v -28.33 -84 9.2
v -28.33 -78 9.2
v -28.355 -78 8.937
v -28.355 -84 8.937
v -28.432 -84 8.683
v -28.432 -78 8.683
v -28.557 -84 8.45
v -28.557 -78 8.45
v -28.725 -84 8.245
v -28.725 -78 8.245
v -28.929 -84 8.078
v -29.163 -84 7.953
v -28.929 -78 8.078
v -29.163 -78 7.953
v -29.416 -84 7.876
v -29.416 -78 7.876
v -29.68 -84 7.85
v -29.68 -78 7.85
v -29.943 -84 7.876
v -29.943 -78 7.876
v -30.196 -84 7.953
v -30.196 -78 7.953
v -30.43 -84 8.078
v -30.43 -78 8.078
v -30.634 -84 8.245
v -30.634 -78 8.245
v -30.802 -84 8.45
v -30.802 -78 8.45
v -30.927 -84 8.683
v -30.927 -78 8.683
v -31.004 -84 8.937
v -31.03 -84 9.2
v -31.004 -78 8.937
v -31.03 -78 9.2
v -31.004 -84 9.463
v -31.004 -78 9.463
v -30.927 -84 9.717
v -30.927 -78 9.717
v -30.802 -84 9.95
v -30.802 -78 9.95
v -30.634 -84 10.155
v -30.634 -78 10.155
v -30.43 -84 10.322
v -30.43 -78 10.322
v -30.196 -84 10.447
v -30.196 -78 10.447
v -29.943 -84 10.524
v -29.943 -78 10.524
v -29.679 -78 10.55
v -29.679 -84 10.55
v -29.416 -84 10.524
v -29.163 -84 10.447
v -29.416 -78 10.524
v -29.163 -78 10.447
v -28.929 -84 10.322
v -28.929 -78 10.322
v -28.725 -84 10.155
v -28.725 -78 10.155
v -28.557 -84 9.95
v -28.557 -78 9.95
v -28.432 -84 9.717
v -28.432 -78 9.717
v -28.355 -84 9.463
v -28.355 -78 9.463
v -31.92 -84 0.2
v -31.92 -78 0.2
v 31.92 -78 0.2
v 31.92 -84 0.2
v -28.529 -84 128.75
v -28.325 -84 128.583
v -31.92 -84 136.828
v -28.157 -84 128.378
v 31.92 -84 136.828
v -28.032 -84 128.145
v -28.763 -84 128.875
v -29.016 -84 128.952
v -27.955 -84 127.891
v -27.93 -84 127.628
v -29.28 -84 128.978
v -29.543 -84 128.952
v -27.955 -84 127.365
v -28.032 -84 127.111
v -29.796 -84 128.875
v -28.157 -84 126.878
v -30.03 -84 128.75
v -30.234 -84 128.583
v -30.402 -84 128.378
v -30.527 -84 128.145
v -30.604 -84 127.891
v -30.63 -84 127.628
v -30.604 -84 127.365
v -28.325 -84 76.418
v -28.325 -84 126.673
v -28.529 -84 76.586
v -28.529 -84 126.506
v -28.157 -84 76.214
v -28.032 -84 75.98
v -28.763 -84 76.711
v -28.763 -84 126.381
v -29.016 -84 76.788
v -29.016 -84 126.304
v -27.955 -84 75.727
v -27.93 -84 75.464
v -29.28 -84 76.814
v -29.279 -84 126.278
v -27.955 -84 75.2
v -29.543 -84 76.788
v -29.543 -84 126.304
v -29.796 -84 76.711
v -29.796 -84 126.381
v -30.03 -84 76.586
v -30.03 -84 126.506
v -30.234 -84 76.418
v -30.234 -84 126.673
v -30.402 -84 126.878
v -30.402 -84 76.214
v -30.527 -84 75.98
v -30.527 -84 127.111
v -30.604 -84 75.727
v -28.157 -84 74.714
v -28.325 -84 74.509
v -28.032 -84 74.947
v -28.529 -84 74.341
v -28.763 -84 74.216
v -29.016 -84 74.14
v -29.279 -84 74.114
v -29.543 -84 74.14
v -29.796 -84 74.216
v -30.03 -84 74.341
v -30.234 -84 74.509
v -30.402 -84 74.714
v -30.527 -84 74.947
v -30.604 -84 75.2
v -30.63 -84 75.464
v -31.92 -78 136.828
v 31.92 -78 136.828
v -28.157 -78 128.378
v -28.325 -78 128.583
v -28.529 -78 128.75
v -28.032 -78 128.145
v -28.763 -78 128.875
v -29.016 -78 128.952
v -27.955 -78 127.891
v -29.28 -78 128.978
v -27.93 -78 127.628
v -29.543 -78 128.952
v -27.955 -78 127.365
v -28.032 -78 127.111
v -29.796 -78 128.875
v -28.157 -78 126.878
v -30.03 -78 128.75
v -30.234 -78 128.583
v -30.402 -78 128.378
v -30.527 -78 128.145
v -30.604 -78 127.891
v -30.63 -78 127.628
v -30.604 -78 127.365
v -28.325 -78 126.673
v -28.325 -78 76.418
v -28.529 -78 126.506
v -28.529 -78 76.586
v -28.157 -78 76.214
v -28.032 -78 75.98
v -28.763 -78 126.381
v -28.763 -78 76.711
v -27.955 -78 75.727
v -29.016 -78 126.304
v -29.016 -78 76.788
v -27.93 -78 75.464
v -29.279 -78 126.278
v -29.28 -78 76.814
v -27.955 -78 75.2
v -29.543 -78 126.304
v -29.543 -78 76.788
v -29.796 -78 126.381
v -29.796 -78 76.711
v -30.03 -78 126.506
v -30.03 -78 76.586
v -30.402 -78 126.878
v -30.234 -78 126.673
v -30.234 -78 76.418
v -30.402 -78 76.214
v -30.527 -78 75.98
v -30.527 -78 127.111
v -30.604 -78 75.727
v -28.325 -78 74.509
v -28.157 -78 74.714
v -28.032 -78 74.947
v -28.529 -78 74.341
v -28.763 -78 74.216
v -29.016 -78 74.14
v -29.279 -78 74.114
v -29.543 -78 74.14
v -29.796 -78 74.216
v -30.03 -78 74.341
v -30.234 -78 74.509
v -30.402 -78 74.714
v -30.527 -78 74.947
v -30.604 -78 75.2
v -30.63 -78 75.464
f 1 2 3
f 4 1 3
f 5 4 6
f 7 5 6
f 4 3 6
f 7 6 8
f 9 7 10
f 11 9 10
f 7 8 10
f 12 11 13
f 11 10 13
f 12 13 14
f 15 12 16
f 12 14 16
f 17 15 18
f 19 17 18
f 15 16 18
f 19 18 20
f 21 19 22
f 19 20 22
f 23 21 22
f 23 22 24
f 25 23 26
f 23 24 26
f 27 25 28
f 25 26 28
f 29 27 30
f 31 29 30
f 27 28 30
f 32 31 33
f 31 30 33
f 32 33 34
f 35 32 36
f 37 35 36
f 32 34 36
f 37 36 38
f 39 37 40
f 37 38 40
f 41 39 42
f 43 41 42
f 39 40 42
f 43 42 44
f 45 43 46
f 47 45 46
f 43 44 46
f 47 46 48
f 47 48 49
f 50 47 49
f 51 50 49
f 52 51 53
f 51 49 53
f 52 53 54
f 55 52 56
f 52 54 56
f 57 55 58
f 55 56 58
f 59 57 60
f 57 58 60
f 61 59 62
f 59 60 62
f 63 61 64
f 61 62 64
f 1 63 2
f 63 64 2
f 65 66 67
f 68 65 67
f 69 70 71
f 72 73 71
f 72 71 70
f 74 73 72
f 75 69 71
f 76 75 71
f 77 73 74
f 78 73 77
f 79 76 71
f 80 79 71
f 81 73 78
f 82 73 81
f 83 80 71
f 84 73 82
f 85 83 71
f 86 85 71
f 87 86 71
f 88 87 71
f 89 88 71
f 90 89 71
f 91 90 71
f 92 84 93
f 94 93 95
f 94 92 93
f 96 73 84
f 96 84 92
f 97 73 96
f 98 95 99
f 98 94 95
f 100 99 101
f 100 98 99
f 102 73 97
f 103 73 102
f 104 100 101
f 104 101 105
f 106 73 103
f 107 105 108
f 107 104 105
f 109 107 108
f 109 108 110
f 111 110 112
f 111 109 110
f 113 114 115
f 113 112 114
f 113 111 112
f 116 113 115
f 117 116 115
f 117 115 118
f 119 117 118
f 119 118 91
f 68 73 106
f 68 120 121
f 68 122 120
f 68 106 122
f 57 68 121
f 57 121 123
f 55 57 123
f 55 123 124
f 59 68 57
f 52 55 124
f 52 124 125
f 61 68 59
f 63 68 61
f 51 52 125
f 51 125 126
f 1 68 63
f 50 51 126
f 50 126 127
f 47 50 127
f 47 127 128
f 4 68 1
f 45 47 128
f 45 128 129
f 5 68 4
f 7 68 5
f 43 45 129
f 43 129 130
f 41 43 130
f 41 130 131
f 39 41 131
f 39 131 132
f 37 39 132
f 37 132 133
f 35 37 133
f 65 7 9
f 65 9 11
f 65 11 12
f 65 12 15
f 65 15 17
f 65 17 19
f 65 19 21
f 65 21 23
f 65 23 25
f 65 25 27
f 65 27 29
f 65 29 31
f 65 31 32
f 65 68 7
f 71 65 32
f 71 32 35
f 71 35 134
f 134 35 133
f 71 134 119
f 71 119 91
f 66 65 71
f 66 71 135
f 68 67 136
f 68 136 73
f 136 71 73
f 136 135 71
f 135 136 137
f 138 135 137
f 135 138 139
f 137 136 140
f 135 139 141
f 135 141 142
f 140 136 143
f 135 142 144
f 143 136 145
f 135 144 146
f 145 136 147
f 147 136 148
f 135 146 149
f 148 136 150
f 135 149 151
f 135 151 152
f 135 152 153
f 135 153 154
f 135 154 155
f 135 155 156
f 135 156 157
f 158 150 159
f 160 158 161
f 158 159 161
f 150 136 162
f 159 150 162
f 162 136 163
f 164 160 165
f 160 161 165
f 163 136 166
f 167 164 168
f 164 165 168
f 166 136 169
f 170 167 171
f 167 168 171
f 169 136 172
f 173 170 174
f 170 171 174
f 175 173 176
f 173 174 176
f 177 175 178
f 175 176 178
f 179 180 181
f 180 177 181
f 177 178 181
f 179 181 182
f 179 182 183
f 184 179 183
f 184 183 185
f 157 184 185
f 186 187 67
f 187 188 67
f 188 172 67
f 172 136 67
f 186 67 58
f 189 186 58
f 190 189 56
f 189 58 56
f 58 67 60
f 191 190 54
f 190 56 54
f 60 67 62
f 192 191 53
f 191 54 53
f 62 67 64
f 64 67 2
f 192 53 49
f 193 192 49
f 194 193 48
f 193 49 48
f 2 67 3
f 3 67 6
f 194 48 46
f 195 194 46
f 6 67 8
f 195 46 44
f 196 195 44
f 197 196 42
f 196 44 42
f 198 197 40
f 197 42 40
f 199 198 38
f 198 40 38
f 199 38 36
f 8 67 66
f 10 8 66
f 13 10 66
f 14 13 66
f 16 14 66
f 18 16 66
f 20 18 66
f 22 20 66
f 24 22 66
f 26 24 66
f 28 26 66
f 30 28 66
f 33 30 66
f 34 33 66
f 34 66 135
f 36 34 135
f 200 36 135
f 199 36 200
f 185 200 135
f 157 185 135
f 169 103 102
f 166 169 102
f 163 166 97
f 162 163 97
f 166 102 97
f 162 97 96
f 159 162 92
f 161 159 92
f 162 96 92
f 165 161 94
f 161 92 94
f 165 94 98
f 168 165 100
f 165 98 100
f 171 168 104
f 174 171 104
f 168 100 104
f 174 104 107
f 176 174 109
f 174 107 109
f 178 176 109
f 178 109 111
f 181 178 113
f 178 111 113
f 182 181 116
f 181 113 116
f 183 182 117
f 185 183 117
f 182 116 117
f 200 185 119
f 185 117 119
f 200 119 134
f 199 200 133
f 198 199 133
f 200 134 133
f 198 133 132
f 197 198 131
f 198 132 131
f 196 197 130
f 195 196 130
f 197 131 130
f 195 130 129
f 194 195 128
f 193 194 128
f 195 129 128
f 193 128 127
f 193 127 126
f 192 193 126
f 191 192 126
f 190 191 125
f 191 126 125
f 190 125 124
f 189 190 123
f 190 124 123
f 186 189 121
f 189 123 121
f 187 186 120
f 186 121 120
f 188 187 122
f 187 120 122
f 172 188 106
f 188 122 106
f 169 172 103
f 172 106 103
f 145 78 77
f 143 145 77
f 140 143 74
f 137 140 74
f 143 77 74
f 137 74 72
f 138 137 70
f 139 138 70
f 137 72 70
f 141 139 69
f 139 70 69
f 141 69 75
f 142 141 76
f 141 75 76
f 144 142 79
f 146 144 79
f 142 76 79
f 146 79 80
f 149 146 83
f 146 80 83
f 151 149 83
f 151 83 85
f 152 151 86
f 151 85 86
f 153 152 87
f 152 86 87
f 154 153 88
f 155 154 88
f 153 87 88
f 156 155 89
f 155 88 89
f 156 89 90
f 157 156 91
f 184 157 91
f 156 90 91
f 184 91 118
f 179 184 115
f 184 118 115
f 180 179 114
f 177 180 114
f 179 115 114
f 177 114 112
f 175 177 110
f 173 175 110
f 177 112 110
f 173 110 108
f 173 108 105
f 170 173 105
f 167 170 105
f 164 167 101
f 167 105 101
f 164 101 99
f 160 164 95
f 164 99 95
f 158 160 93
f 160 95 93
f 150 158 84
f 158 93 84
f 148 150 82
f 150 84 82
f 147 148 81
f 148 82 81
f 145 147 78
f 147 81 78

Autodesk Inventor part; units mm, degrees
ref_plane "YZ Plane" through (0, 0, 0) normal (1, 0, 0) x (0, 1, 0)
ref_plane "XZ Plane" through (0, 0, 0) normal (0, 1, 0) x (-1, 0, 0)
ref_plane "XY Plane" through (0, 0, 0) normal (0, 0, 1) x (1, 0, 0)
sketch "스케치1" plane through (0, 0, 0.2) normal (0, 0, 1) x (1, 0, 0)
  circle A0 centre (-22.9203, -41.3997) radius 1.35 projected
  circle A1 centre (-22.9203, 35.0003) radius 1.35 projected
  line L0 (-31.9205, -84) -> (-31.9205, 78) projected
  line L1 (31.9205, -84) -> (-31.9205, -84) projected
  line L2 (31.9205, 78) -> (31.9205, -84) projected
  line L3 (-31.9205, 78) -> (31.9205, 78) projected
  circle A2 centre (-22.9203, -75) radius 1.45 projected
  circle A3 centre (-22.9203, 69) radius 1.45 projected
  line L4 (-31.9205, -84) -> (31.9205, -84)
  line L5 (31.9205, -84) -> (31.9205, -78)
  line L6 (31.9205, -78) -> (-31.9205, -78)
  line L7 (-31.9205, -78) -> (-31.9205, -84)
  point P0 (0, 0)
  point P1 (-31.9205, -78)
extrude "돌출1" add sketch "스케치1" along normal blind 136.628 contours L0 L6 L2 L1
sketch "스케치4" plane through (-31.9205, -84, 0.2) normal (0, -1, 0) x (1, 0, 0)
  circle A0 centre (2.641, 9) radius 1.35 projected
  circle A1 centre (2.641, 75.2636) radius 1.35 projected
  point P0 (31.9205, -0.2)
extrude "돌출4" cut sketch "스케치4" against normal through all contours A1
sketch "스케치5" plane through (-31.9205, -84, 0.2) normal (0, -1, 0) x (1, 0, 0)
  circle A0 centre (2.641, 127.428) radius 1.35 projected
  point P0 (31.9205, -0.2)
extrude "돌출5" cut sketch "스케치5" against normal up to next
sketch "스케치6" plane through (-31.9205, -78, 0.2) normal (0, 1, 0) x (1, 0, 0)
  circle A0 centre (2.241, -9) radius 1.35 projected
  point P0 (31.9205, 0.2)
extrude "돌출6" cut sketch "스케치6" against normal up to next
properties part number "부품82" material "PMMA 플라스틱"
